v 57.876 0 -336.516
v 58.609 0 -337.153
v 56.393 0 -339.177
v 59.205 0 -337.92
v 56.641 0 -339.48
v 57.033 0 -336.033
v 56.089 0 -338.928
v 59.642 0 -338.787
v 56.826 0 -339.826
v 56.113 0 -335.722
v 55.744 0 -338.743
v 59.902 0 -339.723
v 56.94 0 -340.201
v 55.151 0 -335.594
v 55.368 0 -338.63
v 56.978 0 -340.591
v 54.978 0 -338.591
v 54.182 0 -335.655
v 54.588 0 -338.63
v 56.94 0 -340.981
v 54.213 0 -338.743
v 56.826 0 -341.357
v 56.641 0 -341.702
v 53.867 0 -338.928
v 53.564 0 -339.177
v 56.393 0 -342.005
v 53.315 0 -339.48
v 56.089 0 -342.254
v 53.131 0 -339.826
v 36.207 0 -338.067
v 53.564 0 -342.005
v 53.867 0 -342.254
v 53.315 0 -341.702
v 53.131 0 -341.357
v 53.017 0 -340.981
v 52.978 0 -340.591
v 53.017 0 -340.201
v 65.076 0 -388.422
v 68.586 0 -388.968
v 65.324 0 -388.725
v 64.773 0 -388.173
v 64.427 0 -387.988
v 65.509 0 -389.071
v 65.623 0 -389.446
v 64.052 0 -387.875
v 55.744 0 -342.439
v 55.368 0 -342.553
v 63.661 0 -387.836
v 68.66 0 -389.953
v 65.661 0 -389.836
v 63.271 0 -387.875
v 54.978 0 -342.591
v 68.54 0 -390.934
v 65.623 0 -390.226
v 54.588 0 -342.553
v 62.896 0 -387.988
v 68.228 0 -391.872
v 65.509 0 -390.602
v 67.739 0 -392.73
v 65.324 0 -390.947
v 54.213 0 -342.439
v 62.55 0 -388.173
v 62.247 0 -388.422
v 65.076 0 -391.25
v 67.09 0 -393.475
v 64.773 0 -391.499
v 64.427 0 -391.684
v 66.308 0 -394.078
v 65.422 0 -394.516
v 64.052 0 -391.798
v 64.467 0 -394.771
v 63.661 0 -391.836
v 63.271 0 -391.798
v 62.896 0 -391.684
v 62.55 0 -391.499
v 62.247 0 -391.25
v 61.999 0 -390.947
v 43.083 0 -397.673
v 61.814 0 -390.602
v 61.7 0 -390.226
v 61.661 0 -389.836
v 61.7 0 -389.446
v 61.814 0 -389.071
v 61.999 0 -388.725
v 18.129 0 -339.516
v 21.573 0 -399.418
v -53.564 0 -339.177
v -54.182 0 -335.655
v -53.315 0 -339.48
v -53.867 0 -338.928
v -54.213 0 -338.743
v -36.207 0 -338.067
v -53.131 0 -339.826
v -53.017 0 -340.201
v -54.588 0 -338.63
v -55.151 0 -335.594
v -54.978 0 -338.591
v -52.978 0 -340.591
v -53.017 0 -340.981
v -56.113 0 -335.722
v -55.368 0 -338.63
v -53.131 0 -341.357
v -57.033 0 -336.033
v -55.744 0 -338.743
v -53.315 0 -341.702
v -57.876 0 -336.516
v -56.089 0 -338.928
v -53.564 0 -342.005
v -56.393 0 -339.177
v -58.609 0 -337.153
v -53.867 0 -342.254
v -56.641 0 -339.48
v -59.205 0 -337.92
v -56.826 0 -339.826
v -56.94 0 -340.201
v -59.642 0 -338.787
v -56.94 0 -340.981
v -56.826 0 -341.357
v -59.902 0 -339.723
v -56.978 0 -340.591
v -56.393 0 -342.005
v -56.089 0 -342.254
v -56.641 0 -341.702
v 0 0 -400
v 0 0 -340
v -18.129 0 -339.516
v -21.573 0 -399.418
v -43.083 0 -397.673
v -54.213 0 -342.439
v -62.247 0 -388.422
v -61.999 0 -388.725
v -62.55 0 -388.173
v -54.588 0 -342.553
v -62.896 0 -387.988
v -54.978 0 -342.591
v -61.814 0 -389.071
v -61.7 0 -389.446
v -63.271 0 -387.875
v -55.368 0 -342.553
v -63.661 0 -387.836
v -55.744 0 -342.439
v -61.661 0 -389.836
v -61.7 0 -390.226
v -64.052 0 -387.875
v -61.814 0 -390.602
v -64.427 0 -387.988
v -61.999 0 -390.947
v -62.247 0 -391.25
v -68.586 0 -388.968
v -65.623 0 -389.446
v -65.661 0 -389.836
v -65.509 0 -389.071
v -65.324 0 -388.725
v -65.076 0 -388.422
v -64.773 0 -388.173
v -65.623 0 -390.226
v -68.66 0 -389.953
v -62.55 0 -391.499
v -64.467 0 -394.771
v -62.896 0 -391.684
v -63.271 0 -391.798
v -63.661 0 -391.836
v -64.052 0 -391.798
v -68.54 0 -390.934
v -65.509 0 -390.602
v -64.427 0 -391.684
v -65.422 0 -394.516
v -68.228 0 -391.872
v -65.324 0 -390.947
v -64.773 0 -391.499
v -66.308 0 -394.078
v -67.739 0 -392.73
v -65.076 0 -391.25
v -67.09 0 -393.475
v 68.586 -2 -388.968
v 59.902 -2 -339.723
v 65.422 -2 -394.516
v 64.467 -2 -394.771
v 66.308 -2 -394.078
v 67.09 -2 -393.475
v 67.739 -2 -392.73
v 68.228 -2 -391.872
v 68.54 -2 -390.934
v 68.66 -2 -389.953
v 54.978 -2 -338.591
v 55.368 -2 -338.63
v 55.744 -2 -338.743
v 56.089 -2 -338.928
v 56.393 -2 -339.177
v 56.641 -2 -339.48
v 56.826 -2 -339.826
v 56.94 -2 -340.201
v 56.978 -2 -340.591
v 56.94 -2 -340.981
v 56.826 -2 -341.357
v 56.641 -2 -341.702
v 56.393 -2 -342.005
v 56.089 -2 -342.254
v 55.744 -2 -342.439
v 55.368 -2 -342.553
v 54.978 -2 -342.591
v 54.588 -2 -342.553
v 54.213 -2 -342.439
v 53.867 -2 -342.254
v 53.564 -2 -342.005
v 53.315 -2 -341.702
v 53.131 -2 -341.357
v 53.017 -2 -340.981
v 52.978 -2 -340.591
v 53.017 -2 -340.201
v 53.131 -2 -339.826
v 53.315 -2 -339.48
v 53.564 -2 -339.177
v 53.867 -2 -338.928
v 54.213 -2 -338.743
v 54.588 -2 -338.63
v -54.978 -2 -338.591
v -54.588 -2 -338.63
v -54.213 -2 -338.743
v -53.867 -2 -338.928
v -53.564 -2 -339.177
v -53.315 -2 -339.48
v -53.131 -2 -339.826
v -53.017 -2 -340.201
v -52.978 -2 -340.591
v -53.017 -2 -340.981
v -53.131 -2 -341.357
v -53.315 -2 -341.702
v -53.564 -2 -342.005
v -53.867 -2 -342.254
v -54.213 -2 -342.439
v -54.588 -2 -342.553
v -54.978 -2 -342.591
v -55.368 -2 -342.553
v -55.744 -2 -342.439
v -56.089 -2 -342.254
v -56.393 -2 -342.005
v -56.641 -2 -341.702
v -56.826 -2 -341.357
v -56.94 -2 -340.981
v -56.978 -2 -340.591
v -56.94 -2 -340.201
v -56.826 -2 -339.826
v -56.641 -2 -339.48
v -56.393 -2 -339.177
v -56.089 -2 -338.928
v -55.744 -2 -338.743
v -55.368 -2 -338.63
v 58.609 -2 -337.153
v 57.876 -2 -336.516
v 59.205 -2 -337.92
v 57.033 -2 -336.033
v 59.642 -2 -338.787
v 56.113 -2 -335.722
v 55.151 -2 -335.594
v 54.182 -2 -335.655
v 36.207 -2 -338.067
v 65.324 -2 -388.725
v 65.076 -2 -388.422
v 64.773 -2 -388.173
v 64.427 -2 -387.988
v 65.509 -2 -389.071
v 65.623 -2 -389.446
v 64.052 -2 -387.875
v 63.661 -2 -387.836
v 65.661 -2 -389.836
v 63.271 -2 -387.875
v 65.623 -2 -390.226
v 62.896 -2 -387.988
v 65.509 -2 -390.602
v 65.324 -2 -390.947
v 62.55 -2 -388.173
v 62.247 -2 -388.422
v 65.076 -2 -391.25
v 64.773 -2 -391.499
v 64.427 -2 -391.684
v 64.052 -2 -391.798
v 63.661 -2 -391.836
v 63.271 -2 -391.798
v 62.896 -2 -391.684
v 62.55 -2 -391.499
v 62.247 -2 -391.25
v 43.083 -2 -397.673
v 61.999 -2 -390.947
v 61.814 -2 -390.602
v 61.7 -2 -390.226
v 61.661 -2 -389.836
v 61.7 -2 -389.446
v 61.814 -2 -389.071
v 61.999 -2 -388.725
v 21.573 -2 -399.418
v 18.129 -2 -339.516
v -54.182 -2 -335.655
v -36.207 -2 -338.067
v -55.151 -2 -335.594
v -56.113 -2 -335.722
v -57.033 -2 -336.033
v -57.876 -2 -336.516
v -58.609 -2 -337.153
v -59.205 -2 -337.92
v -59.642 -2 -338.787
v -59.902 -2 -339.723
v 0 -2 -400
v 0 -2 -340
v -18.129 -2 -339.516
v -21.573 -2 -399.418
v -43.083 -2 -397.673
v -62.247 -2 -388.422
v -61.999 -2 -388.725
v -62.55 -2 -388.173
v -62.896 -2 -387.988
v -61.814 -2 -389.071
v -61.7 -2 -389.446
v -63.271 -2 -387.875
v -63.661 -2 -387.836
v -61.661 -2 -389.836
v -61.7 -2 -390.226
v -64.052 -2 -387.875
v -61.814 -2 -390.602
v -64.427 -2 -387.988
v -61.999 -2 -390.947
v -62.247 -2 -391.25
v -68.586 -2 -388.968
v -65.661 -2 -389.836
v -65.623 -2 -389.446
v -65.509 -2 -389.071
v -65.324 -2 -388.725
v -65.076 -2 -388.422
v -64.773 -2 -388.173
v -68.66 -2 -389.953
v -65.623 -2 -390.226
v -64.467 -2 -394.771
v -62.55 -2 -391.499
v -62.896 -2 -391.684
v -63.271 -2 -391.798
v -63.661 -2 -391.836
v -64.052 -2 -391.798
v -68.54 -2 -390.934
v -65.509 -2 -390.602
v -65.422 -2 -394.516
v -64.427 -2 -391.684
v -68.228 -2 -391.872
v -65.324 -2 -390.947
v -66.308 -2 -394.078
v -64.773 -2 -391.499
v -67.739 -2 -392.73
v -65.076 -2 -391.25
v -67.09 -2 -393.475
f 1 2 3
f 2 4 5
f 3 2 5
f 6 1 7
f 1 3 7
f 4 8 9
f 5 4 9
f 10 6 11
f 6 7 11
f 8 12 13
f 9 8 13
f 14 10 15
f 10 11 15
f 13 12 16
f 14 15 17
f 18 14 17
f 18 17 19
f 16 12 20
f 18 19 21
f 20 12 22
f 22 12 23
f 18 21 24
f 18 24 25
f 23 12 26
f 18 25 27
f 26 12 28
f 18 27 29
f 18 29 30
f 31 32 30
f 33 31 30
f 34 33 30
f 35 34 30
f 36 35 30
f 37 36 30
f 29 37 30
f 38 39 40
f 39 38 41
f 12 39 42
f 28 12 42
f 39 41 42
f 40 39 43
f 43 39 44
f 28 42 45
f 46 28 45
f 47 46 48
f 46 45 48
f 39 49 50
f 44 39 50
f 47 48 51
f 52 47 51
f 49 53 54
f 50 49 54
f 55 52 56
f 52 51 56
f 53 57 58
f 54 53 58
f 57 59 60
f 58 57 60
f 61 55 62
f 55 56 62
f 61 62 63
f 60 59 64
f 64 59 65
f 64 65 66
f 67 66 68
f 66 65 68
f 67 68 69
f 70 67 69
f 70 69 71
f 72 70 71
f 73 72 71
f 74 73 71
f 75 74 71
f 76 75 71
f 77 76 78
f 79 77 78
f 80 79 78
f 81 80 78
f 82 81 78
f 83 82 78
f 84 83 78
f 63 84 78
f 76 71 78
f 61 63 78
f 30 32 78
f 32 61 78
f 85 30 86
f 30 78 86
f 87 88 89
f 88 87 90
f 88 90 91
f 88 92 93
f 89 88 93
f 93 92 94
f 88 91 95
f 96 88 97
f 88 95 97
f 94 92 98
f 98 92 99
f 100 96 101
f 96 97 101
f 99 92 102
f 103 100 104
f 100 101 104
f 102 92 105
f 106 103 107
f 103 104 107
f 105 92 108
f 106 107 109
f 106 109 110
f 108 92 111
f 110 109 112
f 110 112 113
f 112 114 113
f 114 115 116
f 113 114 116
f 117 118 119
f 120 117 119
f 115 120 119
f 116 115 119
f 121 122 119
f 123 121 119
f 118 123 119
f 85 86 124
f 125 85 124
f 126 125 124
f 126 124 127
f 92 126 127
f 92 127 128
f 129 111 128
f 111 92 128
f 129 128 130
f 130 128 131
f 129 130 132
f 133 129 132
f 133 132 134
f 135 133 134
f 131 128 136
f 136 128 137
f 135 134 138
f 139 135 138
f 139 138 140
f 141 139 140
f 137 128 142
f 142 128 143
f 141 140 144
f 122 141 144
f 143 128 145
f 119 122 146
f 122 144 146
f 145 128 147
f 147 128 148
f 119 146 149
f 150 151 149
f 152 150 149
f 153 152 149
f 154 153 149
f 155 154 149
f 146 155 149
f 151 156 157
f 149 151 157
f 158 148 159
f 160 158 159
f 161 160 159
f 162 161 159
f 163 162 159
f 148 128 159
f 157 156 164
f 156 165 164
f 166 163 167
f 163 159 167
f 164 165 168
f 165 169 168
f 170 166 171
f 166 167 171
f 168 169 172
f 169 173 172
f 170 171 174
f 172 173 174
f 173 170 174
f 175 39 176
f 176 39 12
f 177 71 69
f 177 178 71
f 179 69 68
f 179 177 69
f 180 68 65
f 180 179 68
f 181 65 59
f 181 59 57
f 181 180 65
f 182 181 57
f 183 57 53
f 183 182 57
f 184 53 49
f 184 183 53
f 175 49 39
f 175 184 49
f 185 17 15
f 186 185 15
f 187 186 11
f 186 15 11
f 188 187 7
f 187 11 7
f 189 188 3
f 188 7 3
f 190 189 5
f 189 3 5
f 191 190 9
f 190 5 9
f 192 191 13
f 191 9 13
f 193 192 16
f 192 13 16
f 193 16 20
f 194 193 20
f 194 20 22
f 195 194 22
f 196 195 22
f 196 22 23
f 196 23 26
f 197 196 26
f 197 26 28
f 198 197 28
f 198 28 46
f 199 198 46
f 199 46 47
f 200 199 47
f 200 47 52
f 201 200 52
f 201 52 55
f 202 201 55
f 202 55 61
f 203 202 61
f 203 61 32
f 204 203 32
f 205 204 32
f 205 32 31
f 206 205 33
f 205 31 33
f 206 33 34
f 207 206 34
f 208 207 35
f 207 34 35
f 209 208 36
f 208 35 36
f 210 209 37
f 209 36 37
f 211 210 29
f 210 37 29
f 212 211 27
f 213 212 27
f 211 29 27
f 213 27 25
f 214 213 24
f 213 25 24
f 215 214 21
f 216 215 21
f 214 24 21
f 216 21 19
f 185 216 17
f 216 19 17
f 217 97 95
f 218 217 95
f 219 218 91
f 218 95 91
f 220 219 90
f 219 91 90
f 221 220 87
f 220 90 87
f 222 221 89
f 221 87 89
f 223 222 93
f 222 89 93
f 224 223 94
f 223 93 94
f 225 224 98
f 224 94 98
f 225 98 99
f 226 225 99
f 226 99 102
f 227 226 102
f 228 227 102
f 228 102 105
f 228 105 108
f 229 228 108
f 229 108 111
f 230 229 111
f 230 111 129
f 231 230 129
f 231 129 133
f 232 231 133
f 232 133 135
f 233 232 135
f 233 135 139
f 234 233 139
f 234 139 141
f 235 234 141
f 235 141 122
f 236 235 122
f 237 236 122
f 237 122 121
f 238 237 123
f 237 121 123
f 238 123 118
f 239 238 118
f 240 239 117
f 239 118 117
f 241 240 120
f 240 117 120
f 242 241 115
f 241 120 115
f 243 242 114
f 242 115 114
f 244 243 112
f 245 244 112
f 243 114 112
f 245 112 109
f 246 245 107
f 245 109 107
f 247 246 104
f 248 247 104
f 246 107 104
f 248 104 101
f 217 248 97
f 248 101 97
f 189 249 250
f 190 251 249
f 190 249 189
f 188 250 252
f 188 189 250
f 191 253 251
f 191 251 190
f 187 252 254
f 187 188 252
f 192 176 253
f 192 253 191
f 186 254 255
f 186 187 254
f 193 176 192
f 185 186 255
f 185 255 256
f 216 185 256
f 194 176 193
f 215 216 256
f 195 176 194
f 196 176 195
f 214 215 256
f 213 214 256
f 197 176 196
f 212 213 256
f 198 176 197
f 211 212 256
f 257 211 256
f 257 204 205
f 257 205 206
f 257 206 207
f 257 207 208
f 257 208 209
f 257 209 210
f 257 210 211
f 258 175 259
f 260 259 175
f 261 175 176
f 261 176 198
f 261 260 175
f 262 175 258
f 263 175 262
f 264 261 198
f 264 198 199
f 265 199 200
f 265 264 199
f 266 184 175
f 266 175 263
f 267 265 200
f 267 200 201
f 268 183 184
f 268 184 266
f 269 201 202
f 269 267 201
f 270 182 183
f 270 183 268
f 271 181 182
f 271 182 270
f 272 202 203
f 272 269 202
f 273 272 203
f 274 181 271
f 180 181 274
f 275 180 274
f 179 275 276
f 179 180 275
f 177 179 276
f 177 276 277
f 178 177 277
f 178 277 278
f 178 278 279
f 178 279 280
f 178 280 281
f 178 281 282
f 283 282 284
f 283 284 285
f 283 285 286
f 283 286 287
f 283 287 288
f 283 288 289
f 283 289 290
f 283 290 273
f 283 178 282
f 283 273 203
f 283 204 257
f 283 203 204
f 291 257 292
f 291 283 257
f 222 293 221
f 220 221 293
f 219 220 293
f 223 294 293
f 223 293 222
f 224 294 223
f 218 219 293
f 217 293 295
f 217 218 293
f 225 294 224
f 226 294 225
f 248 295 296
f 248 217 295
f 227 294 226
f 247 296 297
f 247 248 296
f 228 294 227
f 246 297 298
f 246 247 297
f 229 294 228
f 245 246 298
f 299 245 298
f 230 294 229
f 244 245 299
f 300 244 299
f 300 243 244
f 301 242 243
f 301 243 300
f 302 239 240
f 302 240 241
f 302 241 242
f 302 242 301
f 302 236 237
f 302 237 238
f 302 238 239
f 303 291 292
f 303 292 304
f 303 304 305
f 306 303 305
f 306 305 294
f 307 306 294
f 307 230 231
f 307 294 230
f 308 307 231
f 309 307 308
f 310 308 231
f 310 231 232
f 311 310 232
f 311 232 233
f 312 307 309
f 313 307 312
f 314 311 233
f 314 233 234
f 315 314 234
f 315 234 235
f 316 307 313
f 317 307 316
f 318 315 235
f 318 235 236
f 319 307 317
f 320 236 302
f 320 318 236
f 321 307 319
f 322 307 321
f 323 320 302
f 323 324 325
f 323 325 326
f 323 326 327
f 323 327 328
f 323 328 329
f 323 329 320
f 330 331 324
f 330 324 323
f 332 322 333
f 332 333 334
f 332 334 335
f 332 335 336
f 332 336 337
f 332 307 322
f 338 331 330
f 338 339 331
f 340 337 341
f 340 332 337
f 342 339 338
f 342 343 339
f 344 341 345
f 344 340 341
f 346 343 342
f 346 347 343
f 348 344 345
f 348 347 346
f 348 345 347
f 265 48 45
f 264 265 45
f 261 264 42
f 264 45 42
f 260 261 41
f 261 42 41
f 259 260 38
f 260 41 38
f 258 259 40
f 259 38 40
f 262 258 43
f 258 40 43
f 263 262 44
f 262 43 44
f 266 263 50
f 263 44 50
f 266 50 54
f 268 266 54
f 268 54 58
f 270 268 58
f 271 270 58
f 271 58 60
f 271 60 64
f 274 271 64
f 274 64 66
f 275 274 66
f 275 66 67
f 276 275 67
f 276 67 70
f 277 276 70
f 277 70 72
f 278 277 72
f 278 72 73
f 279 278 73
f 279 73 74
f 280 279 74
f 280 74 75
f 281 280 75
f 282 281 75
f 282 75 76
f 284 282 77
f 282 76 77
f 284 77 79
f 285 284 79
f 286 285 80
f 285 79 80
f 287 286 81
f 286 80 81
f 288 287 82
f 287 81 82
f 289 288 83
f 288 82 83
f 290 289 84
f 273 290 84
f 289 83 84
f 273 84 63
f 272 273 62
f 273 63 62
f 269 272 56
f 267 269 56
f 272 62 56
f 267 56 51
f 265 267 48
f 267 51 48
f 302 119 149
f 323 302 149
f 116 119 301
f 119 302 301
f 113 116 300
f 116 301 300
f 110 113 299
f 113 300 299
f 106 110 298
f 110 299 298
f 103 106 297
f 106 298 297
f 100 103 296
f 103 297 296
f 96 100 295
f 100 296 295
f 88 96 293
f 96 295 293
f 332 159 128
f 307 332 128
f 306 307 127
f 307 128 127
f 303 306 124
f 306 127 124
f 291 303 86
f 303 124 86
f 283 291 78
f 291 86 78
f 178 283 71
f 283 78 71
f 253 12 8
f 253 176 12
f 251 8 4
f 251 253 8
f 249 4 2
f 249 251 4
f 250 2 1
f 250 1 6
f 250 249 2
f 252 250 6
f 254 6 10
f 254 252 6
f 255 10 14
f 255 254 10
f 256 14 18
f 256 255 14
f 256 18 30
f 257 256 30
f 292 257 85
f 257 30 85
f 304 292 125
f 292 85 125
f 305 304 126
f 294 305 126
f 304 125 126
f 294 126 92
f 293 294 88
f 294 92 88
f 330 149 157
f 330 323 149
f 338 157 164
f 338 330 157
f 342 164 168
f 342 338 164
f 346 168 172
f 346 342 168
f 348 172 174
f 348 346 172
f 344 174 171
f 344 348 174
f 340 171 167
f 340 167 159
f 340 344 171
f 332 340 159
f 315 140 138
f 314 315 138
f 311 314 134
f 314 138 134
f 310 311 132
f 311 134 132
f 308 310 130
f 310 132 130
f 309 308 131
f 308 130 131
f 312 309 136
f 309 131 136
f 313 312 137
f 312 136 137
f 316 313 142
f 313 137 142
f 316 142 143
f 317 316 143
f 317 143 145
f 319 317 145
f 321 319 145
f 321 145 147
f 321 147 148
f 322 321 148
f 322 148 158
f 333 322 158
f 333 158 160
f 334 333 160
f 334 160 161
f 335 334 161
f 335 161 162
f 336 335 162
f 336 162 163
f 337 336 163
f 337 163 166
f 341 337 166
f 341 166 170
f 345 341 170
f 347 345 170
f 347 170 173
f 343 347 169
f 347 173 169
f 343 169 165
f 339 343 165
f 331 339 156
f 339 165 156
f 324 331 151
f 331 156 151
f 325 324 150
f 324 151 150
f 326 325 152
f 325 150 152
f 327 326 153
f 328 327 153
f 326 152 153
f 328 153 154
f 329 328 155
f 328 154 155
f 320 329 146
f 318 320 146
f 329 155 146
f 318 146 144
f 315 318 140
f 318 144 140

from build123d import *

# Parameters (mm, degrees)
SM_BASE_FLANGE_1_DEPTH = 2
FILLET_1_R             = 5
SKETCH_2_R             = 2
CUT_EXTRUDE_1_DEPTH    = 10


# Sheet-metal steps are written as plain solids
with BuildPart() as part:
    # Sketch 1 → Базовая кромка1 (new body)
    with BuildSketch(Plane(origin=(0, 0, 0), x_dir=(1, 0, 0), z_dir=(0, 1, 0))):
        with BuildLine():
            Line((-59.040380407, 334.834636024), (-69.459271067, 393.923101205))
            ThreePointArc((-69.459271067, 393.923101205), (0, 400), (69.459271067, 393.923101205))
            Line((69.459271067, 393.923101205), (59.040380407, 334.834636024))
            ThreePointArc((59.040380407, 334.834636024), (0, 340), (-59.040380407, 334.834636024))
        make_face()
    extrude(amount=-SM_BASE_FLANGE_1_DEPTH)

    # Скругление1
    fillet_1_edges = [part.edges().sort_by_distance(p)[0] for p in [
        (-59.040380407, -1, -334.834636024),
        (-69.459271067, -1, -393.923101205),
        (69.459271067, -1, -393.923101205),
        (59.040380407, -1, -334.834636024),
    ]]
    fillet(fillet_1_edges, radius=FILLET_1_R)

    # Эскиз2 → Вырез-Вытянуть1 (cut)
    with BuildSketch(Plane(origin=(0, 0, 0), x_dir=(1, 0, 0), z_dir=(0, 1, 0))):
        with Locations(Location((-63.661495998, 389.836137277, 0), (0, 0, 270))):
            Circle(SKETCH_2_R)
        with Locations(Location((-54.978290599, 340.591232363, 0), (0, 0, 270))):
            Circle(SKETCH_2_R)
        with Locations(Location((63.661495998, 389.836137277, 0), (0, 0, 270))):
            Circle(SKETCH_2_R)
        with Locations(Location((54.978290599, 340.591232363, 0), (0, 0, 270))):
            Circle(SKETCH_2_R)
    extrude(amount=-CUT_EXTRUDE_1_DEPTH, mode=Mode.SUBTRACT)


solid = part.part
